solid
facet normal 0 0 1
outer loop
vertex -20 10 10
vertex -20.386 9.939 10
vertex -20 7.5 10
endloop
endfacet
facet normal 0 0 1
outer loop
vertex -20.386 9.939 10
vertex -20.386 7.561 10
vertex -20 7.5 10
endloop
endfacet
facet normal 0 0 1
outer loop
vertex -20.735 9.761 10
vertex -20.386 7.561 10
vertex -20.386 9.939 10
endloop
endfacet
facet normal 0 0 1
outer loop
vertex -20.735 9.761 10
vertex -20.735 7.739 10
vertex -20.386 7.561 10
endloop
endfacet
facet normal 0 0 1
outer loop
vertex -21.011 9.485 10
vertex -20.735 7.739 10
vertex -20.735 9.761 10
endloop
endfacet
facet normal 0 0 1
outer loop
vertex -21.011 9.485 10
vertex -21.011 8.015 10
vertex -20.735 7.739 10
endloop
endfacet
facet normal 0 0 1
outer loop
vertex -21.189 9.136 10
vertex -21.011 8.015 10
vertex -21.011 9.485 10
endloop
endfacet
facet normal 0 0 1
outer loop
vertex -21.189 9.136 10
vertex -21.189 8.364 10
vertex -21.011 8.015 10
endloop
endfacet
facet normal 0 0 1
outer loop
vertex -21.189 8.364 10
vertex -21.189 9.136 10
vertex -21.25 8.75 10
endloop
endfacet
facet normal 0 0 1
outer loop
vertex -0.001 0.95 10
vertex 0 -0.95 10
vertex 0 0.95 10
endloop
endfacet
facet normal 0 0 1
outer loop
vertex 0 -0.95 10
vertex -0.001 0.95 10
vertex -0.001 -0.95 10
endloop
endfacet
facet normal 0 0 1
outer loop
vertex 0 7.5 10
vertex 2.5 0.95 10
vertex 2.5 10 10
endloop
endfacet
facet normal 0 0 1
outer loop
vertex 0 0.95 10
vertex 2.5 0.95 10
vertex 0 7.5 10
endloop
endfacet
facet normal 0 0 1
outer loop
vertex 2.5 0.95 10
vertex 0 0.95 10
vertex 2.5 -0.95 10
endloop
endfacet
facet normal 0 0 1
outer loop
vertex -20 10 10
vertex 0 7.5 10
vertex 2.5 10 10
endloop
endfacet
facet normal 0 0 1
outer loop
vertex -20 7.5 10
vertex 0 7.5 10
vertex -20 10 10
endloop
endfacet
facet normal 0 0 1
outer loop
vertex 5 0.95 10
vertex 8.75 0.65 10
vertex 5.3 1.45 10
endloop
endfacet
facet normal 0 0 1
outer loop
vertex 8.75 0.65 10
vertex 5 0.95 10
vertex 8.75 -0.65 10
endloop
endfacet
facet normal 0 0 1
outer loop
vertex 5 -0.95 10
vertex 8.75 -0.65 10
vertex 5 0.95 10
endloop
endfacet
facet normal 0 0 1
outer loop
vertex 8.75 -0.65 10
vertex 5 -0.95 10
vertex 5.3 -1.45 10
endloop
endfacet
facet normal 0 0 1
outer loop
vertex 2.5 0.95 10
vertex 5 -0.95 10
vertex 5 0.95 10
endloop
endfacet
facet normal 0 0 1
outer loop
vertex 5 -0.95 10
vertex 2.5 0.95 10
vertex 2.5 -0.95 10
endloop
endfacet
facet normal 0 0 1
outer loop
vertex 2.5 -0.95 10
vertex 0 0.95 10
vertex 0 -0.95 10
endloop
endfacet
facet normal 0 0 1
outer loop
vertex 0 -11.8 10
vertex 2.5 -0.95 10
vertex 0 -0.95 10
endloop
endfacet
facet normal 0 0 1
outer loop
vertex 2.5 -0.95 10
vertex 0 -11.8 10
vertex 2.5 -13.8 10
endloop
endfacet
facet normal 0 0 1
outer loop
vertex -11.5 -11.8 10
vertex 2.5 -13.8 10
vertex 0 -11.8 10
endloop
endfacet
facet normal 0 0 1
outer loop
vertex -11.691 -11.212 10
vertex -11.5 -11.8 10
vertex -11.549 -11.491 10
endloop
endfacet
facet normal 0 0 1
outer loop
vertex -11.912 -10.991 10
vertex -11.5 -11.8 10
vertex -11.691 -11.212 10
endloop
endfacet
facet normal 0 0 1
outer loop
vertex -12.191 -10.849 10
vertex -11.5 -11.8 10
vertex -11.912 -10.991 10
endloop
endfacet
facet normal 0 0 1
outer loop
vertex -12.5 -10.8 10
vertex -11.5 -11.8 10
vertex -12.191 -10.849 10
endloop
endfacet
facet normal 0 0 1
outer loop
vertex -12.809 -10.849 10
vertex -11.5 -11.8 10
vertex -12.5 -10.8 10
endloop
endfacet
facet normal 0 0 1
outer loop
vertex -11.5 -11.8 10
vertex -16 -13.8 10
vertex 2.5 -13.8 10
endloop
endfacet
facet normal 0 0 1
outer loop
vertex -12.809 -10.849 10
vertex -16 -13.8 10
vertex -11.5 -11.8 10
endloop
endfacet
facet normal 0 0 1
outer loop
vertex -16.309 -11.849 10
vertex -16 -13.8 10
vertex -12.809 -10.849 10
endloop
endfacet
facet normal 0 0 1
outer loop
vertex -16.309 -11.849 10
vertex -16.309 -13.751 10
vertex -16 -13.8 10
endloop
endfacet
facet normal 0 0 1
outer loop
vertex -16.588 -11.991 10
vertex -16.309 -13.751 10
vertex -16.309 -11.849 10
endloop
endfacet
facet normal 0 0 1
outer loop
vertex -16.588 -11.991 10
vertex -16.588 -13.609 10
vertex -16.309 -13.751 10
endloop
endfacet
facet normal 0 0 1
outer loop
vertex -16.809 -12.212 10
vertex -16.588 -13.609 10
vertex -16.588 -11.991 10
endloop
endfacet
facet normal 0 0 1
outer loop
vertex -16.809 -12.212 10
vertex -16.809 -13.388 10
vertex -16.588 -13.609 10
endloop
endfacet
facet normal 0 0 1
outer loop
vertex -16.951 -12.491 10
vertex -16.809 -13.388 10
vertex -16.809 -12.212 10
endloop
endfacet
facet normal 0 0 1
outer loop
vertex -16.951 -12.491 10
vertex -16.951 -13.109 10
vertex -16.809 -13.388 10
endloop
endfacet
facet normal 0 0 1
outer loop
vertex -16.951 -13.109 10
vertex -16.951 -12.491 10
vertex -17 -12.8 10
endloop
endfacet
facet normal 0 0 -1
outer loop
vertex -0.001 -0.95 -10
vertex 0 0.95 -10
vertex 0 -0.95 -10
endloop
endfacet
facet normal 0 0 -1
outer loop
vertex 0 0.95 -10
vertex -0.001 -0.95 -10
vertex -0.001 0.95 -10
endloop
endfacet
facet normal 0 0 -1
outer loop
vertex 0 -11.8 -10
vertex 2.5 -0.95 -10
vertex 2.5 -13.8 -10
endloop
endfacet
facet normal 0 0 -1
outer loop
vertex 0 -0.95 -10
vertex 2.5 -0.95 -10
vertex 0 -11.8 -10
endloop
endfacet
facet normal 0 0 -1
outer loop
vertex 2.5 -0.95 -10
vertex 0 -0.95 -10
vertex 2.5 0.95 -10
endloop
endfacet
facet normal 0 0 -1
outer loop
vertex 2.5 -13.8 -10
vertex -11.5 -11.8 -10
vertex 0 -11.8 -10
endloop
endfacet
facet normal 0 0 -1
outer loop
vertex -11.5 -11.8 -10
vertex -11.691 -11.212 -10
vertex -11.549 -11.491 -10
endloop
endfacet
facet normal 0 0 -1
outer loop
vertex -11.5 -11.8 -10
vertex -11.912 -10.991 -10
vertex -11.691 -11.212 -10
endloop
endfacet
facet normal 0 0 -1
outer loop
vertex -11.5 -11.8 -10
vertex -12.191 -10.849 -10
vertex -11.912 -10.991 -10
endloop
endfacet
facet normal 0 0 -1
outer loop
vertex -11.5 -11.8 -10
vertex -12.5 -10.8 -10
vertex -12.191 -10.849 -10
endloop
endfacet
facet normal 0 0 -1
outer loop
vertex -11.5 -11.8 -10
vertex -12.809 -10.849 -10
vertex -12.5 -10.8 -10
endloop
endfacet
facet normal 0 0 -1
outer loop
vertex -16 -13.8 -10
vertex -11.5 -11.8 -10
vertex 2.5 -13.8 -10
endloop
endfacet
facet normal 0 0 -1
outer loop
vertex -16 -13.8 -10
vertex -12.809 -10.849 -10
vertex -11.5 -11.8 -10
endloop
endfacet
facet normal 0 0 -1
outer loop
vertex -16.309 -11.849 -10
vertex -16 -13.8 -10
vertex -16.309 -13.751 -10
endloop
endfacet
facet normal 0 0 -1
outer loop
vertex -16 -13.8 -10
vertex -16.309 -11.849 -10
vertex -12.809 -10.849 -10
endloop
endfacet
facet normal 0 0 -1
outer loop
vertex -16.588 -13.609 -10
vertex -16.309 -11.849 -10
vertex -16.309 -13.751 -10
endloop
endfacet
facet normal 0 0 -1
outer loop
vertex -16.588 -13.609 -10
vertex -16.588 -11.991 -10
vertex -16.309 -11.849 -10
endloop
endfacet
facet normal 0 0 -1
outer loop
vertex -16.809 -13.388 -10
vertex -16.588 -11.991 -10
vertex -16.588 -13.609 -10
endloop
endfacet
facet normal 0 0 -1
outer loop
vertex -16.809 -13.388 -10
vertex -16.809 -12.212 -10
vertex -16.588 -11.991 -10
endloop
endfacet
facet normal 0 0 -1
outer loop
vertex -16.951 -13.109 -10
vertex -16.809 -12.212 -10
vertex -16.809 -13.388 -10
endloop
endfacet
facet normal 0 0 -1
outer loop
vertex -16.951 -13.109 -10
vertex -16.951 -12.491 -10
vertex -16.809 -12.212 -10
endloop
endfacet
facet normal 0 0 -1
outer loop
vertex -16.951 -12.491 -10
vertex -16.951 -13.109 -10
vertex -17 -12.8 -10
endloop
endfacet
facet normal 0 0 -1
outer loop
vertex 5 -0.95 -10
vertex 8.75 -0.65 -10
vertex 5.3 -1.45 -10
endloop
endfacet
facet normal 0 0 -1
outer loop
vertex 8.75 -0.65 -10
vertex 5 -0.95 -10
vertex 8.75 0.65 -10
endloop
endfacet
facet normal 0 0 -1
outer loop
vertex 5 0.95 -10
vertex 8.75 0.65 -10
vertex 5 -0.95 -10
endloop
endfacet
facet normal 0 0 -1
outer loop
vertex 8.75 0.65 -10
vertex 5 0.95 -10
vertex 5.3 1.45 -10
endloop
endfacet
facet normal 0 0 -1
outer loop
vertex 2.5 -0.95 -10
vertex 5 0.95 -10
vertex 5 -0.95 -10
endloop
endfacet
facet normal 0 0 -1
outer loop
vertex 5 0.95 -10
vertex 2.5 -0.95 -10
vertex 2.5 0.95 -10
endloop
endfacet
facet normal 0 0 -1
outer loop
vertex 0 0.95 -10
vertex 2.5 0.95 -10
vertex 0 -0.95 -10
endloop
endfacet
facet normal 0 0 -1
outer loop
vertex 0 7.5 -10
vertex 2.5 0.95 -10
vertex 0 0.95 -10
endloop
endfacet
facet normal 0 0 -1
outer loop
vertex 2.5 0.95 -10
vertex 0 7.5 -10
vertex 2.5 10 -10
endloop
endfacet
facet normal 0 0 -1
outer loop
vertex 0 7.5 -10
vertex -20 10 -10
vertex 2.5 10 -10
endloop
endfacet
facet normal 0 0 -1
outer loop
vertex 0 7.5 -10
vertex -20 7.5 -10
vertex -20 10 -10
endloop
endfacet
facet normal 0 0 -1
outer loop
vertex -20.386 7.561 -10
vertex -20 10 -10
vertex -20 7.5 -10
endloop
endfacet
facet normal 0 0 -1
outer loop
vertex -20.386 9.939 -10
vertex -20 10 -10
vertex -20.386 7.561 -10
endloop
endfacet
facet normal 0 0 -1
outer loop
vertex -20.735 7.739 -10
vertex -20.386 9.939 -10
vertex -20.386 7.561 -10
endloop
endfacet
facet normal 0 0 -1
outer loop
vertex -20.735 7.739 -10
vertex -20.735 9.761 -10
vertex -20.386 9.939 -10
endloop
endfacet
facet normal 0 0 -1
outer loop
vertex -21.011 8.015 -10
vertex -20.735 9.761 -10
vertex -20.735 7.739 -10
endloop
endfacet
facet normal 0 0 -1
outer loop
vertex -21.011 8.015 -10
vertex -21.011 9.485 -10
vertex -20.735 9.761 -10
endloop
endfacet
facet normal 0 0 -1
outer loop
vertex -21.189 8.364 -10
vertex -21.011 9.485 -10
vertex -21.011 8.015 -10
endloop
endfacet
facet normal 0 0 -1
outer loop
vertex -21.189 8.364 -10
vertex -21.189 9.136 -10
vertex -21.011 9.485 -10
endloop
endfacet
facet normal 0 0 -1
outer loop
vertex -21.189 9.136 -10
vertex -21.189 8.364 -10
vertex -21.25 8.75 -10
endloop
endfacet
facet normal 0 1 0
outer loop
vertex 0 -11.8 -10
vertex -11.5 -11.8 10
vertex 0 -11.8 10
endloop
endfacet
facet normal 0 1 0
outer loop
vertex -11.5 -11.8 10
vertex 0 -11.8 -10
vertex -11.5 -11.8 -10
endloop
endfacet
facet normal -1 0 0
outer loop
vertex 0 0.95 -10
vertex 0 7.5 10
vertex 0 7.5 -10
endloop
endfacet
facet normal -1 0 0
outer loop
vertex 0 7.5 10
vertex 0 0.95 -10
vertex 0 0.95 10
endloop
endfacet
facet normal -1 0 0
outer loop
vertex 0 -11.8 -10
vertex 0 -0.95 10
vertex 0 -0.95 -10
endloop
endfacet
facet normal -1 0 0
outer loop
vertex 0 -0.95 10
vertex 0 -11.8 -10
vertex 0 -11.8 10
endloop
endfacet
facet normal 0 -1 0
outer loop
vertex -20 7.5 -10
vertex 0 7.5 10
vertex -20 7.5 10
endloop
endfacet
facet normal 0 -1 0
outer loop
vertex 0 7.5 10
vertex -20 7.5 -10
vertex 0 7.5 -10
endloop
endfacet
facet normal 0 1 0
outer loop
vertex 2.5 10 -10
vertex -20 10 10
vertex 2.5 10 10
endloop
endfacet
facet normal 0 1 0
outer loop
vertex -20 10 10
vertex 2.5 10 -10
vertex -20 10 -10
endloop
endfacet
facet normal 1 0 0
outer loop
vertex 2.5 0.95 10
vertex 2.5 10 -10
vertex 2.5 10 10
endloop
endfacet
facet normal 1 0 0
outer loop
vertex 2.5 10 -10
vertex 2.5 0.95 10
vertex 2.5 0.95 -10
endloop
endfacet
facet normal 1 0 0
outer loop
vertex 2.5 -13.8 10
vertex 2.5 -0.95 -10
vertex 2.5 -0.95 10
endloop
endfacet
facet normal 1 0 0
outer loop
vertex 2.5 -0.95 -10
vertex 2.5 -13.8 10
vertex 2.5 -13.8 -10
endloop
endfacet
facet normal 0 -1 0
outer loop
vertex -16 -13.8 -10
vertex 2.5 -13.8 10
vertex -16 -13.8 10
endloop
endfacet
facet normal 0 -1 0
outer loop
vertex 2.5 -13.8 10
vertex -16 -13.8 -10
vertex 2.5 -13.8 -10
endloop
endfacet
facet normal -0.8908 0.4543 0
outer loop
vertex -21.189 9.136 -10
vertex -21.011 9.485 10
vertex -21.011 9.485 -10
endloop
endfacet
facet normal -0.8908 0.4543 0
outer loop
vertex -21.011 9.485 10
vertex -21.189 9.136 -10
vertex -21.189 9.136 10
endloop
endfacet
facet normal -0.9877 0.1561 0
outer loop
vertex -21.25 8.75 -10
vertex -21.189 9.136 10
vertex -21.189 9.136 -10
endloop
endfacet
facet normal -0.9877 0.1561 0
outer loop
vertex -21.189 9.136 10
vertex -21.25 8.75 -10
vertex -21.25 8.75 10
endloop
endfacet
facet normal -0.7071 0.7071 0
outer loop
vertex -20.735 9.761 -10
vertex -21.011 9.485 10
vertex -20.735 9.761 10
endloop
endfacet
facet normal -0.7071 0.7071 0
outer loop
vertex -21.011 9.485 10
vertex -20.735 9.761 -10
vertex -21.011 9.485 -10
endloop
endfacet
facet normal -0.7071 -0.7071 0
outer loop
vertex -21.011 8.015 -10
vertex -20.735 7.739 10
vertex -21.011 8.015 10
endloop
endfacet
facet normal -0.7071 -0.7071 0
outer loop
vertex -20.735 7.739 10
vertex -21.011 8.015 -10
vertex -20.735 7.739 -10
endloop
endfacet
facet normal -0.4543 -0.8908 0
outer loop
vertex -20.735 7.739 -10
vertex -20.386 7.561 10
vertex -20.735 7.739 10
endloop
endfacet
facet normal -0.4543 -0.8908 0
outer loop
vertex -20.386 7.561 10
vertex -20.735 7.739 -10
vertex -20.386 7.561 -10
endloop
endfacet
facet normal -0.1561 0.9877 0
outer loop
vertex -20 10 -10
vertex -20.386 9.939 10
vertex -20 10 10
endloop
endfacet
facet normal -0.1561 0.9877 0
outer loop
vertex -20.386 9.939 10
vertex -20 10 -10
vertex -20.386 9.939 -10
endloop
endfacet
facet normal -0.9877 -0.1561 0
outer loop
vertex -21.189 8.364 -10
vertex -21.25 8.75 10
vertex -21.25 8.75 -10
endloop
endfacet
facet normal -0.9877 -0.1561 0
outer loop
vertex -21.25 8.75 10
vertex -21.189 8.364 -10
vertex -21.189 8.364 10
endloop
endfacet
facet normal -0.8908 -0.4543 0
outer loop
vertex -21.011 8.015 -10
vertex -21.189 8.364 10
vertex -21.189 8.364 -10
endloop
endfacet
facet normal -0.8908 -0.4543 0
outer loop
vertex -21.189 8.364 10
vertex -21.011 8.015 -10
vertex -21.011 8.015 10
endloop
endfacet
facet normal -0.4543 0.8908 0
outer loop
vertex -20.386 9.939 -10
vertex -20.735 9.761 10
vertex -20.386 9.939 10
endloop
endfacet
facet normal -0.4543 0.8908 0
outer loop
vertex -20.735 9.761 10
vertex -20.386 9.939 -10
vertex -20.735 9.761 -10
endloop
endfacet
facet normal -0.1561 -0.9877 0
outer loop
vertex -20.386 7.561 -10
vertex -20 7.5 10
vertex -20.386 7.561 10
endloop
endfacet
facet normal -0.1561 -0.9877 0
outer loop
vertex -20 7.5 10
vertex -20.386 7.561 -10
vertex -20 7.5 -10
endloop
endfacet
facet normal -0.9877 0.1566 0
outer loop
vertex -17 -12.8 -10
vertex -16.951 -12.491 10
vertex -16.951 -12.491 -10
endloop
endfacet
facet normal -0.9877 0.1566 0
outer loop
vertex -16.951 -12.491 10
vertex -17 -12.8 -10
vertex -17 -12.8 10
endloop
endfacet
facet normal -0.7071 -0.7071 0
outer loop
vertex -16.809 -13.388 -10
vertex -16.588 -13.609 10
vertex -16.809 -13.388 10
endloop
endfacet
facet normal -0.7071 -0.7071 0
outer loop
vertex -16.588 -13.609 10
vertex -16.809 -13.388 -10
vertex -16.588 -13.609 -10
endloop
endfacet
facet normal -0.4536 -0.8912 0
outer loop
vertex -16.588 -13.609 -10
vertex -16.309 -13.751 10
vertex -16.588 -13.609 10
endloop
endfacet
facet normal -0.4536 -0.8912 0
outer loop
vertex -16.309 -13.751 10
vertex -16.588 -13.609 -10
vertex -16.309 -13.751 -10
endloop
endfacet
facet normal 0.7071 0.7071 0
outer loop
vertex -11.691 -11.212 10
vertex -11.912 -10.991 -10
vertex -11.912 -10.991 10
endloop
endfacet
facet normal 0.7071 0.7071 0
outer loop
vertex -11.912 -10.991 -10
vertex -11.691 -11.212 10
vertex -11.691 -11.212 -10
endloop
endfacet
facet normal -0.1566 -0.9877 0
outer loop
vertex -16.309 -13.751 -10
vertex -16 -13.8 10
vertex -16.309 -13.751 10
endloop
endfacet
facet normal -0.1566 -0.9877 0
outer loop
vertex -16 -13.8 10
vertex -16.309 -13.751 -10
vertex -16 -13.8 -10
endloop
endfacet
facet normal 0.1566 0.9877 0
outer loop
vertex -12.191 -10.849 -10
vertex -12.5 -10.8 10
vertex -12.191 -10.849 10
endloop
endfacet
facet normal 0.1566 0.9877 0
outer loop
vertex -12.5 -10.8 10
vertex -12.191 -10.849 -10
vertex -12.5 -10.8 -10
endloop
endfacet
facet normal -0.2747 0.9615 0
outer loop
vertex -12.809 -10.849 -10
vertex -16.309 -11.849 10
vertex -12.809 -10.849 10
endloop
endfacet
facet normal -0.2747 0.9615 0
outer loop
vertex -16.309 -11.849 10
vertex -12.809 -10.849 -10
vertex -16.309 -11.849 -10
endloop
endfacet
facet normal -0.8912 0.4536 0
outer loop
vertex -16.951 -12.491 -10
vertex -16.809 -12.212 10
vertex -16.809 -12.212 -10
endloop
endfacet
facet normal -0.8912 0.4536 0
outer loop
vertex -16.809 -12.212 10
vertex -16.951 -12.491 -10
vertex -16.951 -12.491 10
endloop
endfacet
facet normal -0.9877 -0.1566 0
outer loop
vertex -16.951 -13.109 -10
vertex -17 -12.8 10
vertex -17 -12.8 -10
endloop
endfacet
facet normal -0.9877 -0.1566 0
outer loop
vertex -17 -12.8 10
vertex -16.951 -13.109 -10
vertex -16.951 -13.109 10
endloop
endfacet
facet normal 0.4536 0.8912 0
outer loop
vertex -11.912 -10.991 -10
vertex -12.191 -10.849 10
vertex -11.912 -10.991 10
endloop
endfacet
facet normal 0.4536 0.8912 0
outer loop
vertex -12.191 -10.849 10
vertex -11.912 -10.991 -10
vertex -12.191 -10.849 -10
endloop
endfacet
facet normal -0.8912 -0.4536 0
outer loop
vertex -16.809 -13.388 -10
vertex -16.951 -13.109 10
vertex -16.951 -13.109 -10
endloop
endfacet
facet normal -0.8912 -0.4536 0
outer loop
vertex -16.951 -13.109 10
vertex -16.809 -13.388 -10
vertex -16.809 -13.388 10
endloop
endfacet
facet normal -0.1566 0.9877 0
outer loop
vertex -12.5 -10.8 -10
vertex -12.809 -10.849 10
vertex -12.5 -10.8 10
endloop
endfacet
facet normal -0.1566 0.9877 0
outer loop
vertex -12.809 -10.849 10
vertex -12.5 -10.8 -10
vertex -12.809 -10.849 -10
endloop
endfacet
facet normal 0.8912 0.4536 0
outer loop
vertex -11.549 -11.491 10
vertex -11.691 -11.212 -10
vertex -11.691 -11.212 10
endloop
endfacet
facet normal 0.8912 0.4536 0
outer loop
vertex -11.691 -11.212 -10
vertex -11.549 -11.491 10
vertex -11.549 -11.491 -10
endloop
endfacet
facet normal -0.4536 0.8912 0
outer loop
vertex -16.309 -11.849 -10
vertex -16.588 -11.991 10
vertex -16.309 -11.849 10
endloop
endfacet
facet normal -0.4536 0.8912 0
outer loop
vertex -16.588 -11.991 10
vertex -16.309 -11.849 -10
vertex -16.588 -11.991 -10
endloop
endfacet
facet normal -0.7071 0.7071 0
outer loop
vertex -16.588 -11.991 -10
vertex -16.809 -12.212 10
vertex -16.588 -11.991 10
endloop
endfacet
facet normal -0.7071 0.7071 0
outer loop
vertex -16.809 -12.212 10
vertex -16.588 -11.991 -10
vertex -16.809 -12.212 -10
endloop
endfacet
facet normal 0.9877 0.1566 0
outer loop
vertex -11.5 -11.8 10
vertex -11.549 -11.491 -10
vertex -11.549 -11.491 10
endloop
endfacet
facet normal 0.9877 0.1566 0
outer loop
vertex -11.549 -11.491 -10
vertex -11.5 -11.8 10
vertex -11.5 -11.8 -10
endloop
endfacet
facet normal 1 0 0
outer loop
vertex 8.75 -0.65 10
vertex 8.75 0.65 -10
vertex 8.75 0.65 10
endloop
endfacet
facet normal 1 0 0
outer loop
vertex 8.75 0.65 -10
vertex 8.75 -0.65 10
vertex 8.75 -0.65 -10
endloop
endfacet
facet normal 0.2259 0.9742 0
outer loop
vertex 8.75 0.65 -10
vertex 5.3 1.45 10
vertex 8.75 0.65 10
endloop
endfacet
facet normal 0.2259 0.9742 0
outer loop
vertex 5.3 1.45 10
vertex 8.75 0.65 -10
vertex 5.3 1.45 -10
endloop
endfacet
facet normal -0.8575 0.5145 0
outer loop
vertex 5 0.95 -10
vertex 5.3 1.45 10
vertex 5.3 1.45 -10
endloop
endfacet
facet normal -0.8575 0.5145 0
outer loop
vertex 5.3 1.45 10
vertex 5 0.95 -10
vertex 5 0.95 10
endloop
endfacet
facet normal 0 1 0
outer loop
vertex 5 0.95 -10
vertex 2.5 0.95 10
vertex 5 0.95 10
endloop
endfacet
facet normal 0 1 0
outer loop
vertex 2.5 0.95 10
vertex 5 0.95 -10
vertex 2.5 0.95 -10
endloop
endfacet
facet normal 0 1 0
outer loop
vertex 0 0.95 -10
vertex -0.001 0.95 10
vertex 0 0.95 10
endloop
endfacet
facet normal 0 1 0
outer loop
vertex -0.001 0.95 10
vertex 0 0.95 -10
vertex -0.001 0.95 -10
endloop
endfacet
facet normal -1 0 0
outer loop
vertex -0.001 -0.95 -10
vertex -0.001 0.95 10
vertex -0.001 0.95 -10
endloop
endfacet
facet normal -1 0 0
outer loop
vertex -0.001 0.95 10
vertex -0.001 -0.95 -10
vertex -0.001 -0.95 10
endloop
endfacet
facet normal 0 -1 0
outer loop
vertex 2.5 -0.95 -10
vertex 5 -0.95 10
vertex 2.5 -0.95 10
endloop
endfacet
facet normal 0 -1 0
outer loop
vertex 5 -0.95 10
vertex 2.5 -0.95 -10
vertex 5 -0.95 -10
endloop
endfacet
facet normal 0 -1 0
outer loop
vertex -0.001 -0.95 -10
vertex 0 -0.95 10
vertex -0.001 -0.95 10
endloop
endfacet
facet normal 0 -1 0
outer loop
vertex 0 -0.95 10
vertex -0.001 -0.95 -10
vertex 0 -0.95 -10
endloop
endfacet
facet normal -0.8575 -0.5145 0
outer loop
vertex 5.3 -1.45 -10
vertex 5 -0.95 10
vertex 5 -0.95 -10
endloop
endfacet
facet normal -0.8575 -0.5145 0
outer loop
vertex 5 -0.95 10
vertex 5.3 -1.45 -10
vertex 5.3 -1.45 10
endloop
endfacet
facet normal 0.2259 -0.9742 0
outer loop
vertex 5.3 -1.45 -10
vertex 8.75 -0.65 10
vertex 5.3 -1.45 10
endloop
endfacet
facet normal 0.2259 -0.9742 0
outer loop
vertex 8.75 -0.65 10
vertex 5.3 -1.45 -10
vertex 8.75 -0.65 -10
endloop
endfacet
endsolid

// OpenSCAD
// 'My Headset Hook' Version 1.1 by wstein 
// is licensed under the Attribution - Non-Commercial - Share Alike license. 
// (c) January 2015 
// please refer the complete license here: http://creativecommons.org/licenses/by-nc-sa/3.0/legalcode

// Version 1.1: new parameter for wedge, bugfixes regarding older OpenSCAD version of customizer

// preview[view:north, tilt:bottom]

/* [Base] */
mount_type="front"; // [front,top]
shelf_thickness=19;
bracket_depth=20;

/* [Advanced] */
//defines the relative offset of the hanger text
top_offset=8;
backlash=0.3;
wedge=1.0;
bracket_thickness_wedge=2.0;
bracket_wedge_depth_ratio=0.8;

/* [Hidden] */
bracket_thickness=2.5;

rotate([0,90])
bracket(width=20,shelf_thickness=shelf_thickness,bracket_depth=bracket_depth,bracket_thickness=bracket_thickness,backlash=backlash,mount_type=mount_type);

module bracket(width,shelf_thickness,bracket_depth,bracket_thickness,offset=top_offset,mount_type,backlash)
{
	translate([0,offset,0])
	if(mount_type=="front")
	{
		clamp(width,shelf_thickness,bracket_thickness,bracket_depth,backlash=backlash);
	}
	else
	{
		mirror([0,0,1])
		rotate([-90,0,0])
		clamp(width,shelf_thickness,bracket_thickness,bracket_depth,backlash=backlash);
	}

	tongue(width=width,backlash=backlash,notch_off=.2);
}


module tongue(width=20, thick=2.5,backlash=0,depthness=5,notch_off)
{
	x0=-0.001;
	x1=depthness;
	x2=x1+backlash;
	x3=x2+1.5*thick-backlash;
	
	y0=-thick/2-notch_off;
	y1=y0+notch_off+backlash;
	y2=y1+thick-backlash*2;
	y3=y2+notch_off+backlash;

	points=[
	[x0,y2],
	[x1,y2],
	[x2,y3],
	[x3,y2-backlash],
	[x3,y1+backlash],
	[x2,y0],
	[x1,y1],
	[x0,y1]
	];

	translate([width/2,0,0])
	rotate([0,-90])
	linear_extrude(height=width,convexity=10)
	polygon(points);
}

module clamp(width, shelf_thickness, bracket_thickness,bracket_depth,backlash)
{
	y1=0;
	y2=y1+bracket_thickness_wedge;
	y3=y2+shelf_thickness+backlash;
	y4=y3+bracket_thickness;

	x1=0;
	x2=x1+bracket_thickness;
	x3=x2+bracket_depth*bracket_wedge_depth_ratio;//*3/4;
	x4=x2+bracket_depth;
	x5=x4+bracket_thickness;

	h=20;

	translate([0,-shelf_thickness-bracket_thickness-backlash,bracket_thickness])
	rotate([0,90])
	translate([0,0,-width/2])
	union()
	{
		linear_extrude(height=h,convexity=10)
			polygon([
			[x1,y1],
			[x1,y4],
			[x4,y4],
			[x4,y3],
			[x2,y3],
			[x2,y2],
			[x3,y2],
			[x3,y1],
		]);

		translate([x4,(y3+y4)/2])
		cylinder(r=bracket_thickness/2,h=h,$fn=20);

		hull()
		for(p=[
			[x3-bracket_thickness-wedge,wedge+(y1+y2)/2],
			[x3-bracket_thickness-wedge,(y1+y2)/2],
			[x3,(y1+y2)/2],
		])
		translate(p)
		cylinder(r=bracket_thickness_wedge/2,h=h,$fn=20);
	}
}


